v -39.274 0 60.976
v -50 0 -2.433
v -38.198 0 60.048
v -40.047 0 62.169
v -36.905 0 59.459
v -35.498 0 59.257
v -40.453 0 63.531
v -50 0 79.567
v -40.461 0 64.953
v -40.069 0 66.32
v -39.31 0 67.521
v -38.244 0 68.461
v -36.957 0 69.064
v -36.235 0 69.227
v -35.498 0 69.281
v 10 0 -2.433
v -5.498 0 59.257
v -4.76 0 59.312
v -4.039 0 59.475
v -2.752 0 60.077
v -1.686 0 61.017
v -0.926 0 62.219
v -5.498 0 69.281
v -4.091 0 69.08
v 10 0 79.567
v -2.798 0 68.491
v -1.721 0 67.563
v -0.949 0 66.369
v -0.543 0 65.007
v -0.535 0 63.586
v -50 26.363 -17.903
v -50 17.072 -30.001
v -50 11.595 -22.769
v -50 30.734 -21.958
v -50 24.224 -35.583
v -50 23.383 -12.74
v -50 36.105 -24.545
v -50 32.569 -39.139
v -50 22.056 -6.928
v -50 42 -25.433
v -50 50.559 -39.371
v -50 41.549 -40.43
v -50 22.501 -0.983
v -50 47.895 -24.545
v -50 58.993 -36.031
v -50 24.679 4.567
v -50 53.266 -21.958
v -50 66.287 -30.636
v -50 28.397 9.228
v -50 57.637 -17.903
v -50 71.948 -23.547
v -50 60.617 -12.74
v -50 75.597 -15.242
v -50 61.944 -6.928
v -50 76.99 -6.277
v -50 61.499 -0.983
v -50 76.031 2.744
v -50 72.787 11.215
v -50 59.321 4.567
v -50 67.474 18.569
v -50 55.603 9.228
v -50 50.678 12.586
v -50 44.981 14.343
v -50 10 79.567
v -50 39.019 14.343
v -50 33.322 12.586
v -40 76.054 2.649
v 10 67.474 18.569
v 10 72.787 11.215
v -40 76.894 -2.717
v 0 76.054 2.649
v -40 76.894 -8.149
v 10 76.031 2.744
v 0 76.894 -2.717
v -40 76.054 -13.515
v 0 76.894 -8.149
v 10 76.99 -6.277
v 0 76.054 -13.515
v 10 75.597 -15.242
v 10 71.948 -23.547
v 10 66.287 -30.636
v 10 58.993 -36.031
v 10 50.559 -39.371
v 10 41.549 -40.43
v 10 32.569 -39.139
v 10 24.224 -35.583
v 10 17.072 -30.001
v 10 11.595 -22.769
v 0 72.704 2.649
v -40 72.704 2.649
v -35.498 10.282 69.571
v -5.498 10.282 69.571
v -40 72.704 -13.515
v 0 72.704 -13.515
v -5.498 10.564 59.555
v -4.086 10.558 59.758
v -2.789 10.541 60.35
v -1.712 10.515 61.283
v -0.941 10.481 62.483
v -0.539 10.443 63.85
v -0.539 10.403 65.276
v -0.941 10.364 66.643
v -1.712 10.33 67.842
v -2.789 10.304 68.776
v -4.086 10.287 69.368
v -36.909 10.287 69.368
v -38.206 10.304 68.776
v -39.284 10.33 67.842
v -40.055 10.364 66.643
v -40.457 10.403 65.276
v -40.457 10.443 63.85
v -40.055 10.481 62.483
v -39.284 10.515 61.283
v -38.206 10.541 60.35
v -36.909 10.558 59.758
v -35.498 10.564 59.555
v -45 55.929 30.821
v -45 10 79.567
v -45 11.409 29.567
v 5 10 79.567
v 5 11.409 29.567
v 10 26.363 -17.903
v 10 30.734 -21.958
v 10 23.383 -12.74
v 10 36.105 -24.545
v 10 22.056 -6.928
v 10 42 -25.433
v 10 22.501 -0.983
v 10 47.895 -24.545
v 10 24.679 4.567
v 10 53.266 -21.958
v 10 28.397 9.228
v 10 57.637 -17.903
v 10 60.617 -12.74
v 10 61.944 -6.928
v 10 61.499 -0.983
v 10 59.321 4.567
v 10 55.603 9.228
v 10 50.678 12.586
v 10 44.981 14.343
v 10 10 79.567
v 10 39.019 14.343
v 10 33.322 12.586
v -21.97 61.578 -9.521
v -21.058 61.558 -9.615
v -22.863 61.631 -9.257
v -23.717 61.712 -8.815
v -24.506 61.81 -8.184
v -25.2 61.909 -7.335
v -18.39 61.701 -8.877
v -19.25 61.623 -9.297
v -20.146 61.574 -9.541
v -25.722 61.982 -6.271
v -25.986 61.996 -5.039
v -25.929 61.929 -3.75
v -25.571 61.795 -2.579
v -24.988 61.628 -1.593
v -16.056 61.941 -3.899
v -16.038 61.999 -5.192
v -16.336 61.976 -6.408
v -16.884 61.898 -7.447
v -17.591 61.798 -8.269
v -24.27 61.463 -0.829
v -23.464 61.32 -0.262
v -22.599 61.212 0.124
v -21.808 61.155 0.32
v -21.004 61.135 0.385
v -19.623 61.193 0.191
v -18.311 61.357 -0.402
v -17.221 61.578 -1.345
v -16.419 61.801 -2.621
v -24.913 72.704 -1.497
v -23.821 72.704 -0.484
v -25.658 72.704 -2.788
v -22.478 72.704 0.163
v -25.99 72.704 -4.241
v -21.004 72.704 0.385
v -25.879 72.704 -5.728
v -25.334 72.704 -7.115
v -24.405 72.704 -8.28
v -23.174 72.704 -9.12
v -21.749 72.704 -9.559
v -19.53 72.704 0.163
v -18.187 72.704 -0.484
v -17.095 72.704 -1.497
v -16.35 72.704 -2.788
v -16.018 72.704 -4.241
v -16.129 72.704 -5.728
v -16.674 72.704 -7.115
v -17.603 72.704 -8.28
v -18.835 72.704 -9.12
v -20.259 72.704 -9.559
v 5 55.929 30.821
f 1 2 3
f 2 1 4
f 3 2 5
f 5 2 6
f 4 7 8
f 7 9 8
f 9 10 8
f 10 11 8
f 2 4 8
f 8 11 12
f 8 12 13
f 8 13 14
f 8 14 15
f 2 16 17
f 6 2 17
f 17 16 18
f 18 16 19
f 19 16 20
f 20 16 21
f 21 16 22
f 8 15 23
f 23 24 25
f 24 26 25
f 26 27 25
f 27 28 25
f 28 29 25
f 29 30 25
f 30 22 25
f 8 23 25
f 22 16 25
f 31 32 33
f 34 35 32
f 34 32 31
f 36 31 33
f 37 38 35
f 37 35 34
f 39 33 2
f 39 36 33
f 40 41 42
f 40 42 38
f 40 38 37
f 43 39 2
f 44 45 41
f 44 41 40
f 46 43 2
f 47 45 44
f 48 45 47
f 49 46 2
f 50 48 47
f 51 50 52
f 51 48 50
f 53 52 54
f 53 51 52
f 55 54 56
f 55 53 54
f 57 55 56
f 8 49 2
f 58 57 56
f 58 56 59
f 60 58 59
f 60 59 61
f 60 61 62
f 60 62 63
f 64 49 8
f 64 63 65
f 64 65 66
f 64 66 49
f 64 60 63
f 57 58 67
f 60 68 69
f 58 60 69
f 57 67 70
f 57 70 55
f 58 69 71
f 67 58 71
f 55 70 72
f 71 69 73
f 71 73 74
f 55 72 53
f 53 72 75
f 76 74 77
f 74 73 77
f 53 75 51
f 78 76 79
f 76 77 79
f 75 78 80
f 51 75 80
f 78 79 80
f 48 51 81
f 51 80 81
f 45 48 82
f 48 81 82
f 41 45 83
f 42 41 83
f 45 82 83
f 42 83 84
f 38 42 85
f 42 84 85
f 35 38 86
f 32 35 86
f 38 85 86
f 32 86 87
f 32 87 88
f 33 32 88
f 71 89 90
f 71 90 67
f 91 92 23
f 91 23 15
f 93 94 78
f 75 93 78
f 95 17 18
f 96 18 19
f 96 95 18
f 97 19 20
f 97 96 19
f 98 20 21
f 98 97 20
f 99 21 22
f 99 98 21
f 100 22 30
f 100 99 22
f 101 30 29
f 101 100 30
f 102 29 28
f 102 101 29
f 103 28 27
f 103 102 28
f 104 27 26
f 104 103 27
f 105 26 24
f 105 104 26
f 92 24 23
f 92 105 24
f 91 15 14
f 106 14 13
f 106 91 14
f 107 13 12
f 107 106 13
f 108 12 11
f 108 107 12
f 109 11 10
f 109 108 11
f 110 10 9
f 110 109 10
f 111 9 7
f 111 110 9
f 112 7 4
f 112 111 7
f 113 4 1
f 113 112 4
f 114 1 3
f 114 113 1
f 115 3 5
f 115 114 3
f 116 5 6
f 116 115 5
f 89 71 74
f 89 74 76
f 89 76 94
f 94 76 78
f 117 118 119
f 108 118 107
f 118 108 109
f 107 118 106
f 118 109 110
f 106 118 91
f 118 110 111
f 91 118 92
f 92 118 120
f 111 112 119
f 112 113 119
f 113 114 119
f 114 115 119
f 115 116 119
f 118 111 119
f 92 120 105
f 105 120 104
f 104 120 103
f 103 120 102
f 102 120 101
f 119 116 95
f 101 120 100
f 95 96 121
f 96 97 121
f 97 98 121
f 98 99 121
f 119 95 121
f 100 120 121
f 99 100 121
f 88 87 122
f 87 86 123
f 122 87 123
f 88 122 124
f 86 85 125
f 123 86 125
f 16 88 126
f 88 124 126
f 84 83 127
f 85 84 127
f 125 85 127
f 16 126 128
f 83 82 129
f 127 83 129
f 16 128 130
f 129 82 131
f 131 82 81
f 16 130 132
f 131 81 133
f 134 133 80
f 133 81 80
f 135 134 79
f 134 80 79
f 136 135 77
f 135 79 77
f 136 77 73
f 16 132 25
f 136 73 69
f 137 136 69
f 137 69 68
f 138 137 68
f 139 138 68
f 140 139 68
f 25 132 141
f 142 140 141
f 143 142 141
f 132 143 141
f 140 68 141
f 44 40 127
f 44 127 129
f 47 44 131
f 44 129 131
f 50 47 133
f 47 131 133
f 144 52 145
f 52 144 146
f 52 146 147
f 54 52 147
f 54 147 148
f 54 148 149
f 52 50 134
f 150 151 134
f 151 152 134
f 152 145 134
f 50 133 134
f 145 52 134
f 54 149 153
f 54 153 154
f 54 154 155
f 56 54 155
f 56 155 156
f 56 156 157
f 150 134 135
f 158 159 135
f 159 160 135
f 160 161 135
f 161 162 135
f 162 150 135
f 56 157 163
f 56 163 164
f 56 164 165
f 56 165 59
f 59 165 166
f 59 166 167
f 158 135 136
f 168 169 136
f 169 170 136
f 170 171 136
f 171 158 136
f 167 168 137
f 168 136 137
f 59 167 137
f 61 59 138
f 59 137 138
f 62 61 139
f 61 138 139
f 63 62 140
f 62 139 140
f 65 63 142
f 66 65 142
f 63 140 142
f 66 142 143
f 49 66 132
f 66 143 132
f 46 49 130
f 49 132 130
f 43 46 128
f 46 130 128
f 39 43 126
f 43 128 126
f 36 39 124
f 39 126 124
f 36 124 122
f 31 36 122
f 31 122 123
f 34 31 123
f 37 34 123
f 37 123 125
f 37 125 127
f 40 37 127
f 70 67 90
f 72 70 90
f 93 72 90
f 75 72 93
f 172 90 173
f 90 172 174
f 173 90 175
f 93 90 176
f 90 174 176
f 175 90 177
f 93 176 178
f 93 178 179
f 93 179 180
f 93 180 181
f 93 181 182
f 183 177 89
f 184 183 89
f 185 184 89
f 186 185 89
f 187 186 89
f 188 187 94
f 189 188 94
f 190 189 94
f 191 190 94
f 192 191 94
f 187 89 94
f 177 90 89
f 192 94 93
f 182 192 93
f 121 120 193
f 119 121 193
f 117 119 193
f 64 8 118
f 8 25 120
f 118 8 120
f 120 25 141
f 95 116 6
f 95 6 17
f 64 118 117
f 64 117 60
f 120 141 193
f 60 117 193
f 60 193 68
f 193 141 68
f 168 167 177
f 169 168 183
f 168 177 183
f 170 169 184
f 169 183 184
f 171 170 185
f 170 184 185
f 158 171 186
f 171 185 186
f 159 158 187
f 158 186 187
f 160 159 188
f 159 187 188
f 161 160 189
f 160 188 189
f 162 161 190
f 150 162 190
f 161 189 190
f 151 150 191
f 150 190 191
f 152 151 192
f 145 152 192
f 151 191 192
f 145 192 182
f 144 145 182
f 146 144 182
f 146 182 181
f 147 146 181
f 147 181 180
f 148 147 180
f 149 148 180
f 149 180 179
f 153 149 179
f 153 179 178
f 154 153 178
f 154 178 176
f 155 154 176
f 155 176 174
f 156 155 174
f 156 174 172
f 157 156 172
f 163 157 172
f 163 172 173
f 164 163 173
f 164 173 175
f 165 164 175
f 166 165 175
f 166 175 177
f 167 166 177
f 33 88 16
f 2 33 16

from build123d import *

# Parameters (mm, degrees)
SKETCH2_R           = 20
BOSS_EXTRUDE1_DEPTH = 60
CUT_EXTRUDE2_DEPTH  = 50
CUT_EXTRUDE3_DEPTH  = 50
SKETCH12_W          = 16.164310213
SKETCH12_H          = 9.181328202
CUT_EXTRUDE5_DEPTH  = 40
SKETCH13_R          = 5
CUT_EXTRUDE6_DEPTH  = 40


with BuildPart() as part:
    # Sketch2 → Boss-Extrude1 (new body)
    with BuildSketch(Plane(origin=(0, 0, 0), x_dir=(0, 0, -1), z_dir=(1, 0, 0))):
        with BuildLine():
            Line((-79.56687109, 0), (-79.56687109, 10))
            Line((-79.56687109, 10), (-18.568740921, 67.473716741))
            ThreePointArc((-18.568740921, 67.473716741), (33.570555999, 62.815503761), (22.769179524, 11.595044004))
            Line((22.769179524, 11.595044004), (2.43312891, 0))
            Line((2.43312891, 0), (-79.56687109, 0))
        make_face()
        with Locations((5.43312891, 42)):
            Circle(SKETCH2_R, mode=Mode.SUBTRACT)
    extrude(amount=-BOSS_EXTRUDE1_DEPTH)


with BuildPart() as part_1:
    # Body-Move/Copy1: moved
    add(part.part.moved(Location((5, 0, 0))))

    # Sketch4 → Cut-Extrude2 (cut)
    with BuildSketch(Plane(origin=(0, 0, 0), x_dir=(0, 0, -1), z_dir=(1, 0, 0))):
        Polygon((-79.56687109, 10), (-29.56687109, 11.408616082), (-30.821121194, 55.929267243), align=None)
    extrude(amount=-CUT_EXTRUDE2_DEPTH, mode=Mode.SUBTRACT)

    # Sketch5 → Cut-Extrude3 (cut)
    with BuildSketch(Plane(origin=(0, 12.231875294, 0.344600325), x_dir=(1, 0, 0), z_dir=(0, 0.9996033962131115, 0.028161148400119476))):
        with BuildLine():
            Line((-40.497825503, -59.233865026), (-10.497825503, -59.233865026))
            ThreePointArc((-10.497825503, -59.233865026), (-5.487906474, -64.243784055), (-10.497825503, -69.253703083))
            Line((-10.497825503, -69.253703083), (-40.497825503, -69.253703083))
            ThreePointArc((-40.497825503, -69.253703083), (-45.507744532, -64.243784055), (-40.497825503, -59.233865026))
        make_face()
    extrude(amount=-CUT_EXTRUDE3_DEPTH, mode=Mode.SUBTRACT)


with BuildPart() as part_2:
    # Body-Move/Copy2: moved
    add(part_1.part.moved(Location((5, 0, 0))))

    # Sketch12 → Cut-Extrude5 (cut)
    with BuildSketch(Plane(origin=(0, 0, 0), x_dir=(0, 0, -1), z_dir=(1, 0, 0))):
        with Locations((5.433128911, 77.294344512)):
            Rectangle(SKETCH12_W, SKETCH12_H)
    extrude(amount=-CUT_EXTRUDE5_DEPTH, mode=Mode.SUBTRACT)

    # Sketch13 → Cut-Extrude6 (cut)
    with BuildSketch(Plane(origin=(0, 72.703680411, 0), x_dir=(1, 0, 0), z_dir=(0, 1, 0))):
        with Locations(Location((-21.004088917, 4.614936989, 0), (0, 0, 270))):
            Circle(SKETCH13_R)
    extrude(amount=-CUT_EXTRUDE6_DEPTH, mode=Mode.SUBTRACT)


solid = part_2.part
